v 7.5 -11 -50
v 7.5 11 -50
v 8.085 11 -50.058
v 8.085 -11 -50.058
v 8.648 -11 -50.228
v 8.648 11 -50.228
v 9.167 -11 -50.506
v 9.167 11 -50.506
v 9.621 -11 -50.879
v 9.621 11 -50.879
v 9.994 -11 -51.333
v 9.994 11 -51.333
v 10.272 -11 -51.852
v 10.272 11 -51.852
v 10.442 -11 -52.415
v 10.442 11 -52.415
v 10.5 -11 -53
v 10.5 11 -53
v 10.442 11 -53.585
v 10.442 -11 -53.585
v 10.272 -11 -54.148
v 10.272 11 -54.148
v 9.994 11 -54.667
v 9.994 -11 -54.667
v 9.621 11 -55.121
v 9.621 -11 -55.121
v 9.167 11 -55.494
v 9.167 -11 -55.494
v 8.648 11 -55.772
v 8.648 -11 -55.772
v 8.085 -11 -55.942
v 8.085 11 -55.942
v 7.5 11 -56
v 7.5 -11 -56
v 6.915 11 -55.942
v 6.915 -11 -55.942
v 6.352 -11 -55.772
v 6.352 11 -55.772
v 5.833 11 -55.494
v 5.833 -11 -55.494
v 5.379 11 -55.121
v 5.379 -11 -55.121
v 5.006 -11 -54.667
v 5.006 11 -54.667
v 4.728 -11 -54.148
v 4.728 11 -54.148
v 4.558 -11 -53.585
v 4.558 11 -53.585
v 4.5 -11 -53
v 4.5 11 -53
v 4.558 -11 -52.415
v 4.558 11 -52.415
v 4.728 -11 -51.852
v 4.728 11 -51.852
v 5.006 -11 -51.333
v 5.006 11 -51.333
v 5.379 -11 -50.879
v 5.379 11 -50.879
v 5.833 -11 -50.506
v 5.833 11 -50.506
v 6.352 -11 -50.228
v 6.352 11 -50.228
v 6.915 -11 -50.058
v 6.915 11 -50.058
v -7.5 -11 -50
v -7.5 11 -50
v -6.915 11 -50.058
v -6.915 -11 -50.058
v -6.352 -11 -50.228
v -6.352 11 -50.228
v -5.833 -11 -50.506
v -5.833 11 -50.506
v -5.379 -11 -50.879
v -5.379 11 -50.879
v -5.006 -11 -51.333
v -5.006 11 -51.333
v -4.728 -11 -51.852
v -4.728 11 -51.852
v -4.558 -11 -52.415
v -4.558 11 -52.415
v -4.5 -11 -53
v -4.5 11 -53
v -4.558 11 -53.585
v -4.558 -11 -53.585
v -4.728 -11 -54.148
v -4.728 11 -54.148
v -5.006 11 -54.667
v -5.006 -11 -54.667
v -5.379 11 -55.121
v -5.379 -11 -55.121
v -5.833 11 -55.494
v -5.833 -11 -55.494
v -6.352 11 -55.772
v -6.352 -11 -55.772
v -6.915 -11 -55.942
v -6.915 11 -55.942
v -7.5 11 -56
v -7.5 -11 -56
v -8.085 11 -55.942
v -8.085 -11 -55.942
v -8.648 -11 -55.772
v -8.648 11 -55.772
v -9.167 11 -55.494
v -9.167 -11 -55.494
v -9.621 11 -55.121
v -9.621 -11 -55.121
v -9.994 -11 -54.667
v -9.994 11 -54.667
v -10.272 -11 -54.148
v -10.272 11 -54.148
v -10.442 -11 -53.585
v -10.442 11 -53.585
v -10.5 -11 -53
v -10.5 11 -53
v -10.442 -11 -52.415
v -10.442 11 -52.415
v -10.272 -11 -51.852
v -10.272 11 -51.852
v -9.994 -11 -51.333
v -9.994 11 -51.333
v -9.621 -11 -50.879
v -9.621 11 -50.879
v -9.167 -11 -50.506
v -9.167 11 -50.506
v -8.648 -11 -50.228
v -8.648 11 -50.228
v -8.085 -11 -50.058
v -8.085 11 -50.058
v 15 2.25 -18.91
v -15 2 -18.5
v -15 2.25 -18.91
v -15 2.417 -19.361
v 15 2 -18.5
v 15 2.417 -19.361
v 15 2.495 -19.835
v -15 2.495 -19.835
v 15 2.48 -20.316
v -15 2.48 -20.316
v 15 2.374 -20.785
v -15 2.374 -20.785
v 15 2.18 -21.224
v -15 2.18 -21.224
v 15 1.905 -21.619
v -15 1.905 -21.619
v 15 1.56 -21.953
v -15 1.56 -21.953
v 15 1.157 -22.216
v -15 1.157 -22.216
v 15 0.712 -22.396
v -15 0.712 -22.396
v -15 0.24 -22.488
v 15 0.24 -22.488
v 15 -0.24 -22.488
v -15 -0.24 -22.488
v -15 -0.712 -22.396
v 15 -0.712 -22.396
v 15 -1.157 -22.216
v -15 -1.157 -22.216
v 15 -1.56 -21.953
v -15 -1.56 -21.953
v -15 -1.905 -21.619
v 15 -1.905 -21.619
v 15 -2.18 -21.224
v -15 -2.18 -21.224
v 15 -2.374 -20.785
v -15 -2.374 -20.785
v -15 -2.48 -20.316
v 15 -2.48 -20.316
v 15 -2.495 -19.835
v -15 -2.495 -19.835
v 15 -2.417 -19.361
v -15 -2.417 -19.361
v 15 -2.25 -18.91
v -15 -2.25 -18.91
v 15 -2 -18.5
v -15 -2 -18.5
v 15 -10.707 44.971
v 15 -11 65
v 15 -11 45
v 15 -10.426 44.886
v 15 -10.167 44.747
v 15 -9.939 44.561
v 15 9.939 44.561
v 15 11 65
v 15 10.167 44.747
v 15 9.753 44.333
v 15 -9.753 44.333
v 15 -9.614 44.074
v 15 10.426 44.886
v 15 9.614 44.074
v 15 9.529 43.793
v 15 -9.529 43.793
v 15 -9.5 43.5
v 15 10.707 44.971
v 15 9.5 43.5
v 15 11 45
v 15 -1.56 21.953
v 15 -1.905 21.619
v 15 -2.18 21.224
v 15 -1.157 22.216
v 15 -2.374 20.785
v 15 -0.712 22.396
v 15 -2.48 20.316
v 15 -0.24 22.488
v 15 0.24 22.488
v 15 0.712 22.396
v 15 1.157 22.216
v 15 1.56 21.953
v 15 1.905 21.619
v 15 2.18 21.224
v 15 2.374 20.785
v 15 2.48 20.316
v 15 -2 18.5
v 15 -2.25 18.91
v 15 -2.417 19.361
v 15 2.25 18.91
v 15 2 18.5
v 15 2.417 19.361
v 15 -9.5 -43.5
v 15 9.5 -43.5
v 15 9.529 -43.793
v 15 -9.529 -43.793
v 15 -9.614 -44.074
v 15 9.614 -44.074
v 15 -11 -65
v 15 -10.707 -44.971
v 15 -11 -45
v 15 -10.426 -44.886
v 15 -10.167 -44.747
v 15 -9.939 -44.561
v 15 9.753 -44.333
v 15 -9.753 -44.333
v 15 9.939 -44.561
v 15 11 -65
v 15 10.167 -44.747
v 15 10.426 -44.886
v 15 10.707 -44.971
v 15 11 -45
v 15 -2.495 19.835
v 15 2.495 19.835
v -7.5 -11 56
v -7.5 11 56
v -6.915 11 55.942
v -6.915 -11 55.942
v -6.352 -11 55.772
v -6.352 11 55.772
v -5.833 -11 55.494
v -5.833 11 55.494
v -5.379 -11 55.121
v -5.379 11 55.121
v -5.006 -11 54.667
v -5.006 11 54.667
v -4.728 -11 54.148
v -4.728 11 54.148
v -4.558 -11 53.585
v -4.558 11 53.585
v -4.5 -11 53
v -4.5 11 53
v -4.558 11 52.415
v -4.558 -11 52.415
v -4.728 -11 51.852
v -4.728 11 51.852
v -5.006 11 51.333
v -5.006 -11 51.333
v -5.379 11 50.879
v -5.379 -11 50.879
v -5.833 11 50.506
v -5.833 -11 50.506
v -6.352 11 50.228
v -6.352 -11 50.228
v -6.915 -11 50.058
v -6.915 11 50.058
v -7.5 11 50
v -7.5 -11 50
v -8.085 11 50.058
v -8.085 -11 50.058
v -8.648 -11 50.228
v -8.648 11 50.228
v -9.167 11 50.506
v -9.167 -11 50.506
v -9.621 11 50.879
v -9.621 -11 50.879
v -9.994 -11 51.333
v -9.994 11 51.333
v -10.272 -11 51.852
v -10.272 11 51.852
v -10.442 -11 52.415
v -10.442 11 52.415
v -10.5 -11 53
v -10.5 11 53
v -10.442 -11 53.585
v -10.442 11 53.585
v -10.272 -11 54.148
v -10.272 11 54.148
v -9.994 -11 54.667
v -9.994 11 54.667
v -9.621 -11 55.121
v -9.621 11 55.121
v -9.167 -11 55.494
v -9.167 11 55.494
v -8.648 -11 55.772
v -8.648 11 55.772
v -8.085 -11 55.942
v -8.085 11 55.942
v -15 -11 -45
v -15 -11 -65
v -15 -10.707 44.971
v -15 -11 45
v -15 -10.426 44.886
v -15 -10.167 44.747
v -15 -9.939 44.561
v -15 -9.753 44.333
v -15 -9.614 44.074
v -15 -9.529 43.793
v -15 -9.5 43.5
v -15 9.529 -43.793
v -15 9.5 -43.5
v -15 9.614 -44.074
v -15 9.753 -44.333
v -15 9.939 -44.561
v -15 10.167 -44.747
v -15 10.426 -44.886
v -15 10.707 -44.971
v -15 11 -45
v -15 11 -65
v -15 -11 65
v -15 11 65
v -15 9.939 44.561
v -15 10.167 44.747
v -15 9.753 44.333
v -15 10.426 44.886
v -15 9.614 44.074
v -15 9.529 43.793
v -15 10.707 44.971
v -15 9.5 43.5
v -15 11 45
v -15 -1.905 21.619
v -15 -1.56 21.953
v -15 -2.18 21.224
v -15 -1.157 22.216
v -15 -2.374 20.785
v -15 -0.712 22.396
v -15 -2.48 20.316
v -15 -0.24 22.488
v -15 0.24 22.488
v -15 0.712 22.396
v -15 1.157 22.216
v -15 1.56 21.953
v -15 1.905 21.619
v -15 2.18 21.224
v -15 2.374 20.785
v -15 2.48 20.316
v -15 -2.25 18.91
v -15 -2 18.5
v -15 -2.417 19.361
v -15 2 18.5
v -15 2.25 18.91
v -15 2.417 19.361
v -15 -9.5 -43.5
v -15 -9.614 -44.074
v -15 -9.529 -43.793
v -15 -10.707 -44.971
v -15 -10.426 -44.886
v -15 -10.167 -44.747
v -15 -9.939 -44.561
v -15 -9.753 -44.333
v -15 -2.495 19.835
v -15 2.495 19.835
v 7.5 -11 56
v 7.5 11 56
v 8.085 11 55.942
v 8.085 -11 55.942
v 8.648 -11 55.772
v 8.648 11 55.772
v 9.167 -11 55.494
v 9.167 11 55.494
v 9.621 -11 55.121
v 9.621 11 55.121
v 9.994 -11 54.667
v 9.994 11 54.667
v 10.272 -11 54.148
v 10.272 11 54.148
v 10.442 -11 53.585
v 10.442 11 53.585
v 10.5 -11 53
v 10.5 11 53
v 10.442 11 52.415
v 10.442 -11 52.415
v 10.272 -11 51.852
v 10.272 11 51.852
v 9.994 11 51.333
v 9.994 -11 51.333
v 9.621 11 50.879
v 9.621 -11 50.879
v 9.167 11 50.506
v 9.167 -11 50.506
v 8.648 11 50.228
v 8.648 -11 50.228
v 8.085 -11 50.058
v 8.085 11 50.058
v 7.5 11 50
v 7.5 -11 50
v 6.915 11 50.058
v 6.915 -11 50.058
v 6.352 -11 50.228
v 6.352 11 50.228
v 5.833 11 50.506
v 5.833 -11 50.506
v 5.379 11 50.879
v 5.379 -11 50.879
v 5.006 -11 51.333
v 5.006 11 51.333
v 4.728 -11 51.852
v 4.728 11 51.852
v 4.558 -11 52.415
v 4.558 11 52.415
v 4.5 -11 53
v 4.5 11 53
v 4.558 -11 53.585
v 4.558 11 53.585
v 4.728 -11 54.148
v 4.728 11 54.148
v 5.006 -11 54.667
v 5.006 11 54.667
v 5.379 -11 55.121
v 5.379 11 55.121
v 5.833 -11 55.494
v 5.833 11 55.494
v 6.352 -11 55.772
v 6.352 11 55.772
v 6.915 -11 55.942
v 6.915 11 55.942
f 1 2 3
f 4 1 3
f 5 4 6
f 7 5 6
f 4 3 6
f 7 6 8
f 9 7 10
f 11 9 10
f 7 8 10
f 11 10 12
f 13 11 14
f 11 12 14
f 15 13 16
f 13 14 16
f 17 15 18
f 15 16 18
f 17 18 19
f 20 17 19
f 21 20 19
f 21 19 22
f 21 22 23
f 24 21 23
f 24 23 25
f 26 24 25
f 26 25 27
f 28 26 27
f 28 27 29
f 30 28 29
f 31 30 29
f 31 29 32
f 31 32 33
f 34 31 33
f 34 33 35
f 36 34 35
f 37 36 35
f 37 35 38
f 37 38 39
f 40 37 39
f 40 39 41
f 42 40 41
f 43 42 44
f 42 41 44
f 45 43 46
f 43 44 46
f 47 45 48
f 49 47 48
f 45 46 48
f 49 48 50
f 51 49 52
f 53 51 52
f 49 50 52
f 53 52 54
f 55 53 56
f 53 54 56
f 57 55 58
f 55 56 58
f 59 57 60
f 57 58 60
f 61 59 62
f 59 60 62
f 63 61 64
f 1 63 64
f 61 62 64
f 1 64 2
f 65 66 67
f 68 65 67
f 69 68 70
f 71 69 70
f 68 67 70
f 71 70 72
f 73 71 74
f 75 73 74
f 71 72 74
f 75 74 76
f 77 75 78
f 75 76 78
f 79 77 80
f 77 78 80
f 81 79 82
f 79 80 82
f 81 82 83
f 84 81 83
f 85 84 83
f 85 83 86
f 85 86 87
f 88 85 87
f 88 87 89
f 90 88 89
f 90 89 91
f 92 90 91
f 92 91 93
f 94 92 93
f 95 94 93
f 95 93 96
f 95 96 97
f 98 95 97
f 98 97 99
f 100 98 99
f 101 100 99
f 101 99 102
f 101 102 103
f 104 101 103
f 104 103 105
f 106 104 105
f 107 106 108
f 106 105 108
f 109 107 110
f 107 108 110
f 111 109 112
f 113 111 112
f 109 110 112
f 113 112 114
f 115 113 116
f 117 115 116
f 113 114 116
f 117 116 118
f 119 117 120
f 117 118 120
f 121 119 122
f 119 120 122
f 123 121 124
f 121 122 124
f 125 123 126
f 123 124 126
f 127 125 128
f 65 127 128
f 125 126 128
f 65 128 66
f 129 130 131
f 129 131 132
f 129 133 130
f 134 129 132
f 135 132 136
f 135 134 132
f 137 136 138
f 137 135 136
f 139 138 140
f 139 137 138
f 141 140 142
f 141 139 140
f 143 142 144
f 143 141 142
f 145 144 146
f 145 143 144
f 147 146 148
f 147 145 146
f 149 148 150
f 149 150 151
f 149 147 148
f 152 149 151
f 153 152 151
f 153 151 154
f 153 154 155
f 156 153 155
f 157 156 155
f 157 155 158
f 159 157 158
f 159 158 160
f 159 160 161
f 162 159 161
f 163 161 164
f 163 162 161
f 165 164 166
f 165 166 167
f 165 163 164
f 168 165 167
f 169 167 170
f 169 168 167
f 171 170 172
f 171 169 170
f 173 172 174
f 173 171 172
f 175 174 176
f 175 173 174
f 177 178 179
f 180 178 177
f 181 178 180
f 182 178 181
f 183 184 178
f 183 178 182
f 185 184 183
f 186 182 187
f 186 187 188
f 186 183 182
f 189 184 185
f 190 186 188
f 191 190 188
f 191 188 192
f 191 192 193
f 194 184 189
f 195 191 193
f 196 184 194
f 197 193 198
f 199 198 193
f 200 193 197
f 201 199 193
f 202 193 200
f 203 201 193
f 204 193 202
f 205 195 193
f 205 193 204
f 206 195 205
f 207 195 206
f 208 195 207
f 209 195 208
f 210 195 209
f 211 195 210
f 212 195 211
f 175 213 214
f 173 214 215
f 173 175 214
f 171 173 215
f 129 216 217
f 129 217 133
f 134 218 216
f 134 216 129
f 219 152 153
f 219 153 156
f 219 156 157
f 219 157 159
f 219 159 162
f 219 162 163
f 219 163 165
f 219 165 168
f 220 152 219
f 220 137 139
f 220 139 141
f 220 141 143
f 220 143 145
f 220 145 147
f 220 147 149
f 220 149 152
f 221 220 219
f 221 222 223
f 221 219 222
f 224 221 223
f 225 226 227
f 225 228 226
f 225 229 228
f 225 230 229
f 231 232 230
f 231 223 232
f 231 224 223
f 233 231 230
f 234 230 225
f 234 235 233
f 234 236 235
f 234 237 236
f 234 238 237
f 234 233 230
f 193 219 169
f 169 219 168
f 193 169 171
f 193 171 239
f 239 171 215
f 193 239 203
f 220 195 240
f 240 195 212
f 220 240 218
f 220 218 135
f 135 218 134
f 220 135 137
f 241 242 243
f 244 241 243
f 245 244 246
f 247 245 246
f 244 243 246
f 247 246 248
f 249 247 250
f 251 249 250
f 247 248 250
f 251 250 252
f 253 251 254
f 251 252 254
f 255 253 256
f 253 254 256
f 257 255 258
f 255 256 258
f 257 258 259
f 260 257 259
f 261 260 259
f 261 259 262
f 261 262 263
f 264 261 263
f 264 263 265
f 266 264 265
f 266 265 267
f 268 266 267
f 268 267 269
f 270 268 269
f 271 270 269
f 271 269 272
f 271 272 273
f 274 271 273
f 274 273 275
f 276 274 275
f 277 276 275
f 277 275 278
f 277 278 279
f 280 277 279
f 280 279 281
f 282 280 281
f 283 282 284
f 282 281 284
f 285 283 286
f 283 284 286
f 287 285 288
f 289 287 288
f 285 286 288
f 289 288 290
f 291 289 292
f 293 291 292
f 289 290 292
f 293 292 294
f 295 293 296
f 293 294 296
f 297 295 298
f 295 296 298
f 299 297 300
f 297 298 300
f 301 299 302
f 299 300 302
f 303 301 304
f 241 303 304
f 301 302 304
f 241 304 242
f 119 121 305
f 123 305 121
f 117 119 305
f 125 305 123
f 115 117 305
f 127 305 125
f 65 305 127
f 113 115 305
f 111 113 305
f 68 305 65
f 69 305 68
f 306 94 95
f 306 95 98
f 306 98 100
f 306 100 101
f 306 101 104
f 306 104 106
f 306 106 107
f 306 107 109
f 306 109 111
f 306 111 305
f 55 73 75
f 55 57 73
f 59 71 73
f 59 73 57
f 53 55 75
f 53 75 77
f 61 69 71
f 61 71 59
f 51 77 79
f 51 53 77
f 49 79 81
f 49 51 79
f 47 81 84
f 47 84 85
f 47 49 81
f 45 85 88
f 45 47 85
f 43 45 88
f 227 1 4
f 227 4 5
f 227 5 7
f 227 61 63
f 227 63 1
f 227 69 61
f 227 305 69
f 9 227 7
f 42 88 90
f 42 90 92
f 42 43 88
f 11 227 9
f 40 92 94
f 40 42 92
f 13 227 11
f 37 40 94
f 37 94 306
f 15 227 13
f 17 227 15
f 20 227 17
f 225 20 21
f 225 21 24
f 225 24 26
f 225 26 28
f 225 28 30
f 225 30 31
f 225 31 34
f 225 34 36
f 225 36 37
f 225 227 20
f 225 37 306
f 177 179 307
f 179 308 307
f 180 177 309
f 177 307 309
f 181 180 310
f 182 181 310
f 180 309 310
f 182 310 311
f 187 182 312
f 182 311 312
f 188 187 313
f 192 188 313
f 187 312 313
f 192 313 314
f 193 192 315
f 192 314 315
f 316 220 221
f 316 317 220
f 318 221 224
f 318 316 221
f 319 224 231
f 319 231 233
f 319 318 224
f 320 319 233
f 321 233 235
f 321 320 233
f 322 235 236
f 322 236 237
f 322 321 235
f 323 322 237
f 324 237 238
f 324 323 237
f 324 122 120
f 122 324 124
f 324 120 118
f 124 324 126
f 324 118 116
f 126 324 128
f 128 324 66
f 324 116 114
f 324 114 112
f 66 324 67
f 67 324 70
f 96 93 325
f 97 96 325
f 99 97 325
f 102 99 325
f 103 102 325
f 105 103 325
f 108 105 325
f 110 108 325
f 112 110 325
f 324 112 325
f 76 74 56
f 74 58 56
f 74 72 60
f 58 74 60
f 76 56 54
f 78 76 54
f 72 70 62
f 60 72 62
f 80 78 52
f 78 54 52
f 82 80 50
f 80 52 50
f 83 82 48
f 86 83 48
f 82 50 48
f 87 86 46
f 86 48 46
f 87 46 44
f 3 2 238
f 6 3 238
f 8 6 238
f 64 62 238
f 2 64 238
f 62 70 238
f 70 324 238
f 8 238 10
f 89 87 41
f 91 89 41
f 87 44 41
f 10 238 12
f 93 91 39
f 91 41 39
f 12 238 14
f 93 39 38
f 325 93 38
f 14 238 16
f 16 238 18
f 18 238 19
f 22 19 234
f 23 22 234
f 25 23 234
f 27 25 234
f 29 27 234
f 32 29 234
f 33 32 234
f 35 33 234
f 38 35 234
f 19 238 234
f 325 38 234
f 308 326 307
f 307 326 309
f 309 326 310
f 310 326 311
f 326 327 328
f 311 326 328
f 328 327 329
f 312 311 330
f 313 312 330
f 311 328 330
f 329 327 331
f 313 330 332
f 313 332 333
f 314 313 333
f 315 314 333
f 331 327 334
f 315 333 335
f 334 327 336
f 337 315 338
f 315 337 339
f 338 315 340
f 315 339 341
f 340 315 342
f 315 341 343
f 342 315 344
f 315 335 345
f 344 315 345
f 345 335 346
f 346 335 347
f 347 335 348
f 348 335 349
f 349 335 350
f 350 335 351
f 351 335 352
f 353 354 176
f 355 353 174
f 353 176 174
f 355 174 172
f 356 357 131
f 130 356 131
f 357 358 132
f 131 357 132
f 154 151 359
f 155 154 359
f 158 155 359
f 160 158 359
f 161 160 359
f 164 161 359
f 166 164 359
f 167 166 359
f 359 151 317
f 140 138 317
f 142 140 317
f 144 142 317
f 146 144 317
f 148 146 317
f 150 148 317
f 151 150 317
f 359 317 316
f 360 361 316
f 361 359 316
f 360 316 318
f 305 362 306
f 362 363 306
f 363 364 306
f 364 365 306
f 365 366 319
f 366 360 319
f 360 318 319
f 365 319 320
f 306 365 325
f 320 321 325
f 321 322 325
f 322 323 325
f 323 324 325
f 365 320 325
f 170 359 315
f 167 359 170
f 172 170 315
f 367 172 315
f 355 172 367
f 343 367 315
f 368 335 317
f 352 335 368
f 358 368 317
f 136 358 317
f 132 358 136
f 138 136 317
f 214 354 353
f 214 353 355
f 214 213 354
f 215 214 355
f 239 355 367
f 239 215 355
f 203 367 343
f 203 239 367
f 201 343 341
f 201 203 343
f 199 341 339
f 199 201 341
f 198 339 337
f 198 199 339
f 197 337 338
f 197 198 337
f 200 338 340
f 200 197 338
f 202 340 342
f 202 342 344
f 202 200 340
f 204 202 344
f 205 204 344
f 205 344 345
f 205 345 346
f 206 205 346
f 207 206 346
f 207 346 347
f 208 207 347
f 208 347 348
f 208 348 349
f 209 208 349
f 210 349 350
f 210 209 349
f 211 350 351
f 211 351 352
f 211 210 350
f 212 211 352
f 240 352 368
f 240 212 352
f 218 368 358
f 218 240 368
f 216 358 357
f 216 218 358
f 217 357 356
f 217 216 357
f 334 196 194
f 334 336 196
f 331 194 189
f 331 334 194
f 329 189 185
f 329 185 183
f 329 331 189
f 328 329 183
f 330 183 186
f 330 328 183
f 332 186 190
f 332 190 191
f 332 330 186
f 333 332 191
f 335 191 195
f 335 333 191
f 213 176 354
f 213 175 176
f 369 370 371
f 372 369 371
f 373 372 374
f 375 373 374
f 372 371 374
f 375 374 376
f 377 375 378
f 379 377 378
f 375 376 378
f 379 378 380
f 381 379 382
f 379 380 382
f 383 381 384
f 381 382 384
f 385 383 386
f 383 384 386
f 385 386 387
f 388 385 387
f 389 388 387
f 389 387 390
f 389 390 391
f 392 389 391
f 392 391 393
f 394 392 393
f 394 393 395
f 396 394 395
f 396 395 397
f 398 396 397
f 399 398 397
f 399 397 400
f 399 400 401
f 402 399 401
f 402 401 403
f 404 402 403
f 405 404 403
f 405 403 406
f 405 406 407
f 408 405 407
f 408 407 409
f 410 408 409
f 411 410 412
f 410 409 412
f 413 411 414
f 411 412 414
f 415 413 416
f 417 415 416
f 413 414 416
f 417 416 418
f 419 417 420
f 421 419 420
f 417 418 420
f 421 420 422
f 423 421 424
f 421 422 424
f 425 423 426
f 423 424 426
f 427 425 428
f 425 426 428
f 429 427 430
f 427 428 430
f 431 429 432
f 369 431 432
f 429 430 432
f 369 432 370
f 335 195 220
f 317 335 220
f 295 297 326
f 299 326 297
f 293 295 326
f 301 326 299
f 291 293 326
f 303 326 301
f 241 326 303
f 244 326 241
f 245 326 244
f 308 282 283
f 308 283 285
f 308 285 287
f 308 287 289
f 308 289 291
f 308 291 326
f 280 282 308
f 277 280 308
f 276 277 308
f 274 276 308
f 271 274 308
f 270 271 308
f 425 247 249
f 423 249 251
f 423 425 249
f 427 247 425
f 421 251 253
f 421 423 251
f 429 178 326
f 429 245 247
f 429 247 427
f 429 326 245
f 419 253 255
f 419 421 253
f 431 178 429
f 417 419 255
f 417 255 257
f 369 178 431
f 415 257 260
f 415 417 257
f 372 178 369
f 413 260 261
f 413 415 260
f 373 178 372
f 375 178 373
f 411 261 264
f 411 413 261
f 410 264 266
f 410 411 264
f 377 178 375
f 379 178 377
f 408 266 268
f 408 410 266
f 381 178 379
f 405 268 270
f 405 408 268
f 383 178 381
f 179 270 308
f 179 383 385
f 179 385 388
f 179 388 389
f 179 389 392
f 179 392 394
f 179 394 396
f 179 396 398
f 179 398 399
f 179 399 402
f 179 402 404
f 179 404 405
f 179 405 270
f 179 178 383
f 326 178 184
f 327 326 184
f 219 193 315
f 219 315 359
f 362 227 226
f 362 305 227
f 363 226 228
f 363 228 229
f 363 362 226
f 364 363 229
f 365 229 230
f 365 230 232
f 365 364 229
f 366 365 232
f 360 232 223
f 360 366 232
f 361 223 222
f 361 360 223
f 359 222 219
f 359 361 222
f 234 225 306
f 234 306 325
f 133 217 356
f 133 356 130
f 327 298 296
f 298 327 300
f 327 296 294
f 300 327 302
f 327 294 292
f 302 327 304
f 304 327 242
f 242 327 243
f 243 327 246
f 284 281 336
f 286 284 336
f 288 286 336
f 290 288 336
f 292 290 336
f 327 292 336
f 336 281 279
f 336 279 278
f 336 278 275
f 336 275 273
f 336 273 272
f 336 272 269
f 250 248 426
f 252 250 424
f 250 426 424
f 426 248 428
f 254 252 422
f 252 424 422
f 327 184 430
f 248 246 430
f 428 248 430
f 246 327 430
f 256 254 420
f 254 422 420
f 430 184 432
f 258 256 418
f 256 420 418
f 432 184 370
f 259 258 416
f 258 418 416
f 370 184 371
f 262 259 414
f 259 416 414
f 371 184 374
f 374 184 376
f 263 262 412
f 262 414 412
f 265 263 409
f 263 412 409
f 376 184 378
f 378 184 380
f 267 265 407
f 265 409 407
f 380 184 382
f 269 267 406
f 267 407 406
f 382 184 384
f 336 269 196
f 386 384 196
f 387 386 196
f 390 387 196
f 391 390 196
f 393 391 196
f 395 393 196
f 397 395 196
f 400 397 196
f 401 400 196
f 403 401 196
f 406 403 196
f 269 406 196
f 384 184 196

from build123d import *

# Parameters (mm, degrees)
SKETCH1_W           = 130
SKETCH1_H           = 22
BOSS_EXTRUDE1_DEPTH = 15
SKETCH2_R           = 3
CUT_EXTRUDE1_DEPTH  = 71.242437315
SKETCH3_W           = 90
SKETCH3_H           = 1.5
CUT_EXTRUDE2_DEPTH  = 30
FILLET1_R           = 1.5


with BuildPart() as part:
    # Sketch1 → Boss-Extrude1 (new, symmetric)
    with BuildSketch(Plane(origin=(0, 0, 0), x_dir=(0, 0, -1), z_dir=(1, 0, 0))):
        Rectangle(SKETCH1_W, SKETCH1_H)
        with BuildLine():
            Line((-18.5, 2), (18.5, 2))
            ThreePointArc((18.5, 2), (22.5, 0), (18.5, -2))
            Line((18.5, -2), (-18.5, -2))
            ThreePointArc((-18.5, -2), (-22.5, 0), (-18.5, 2))
        make_face(mode=Mode.SUBTRACT)
    extrude(amount=BOSS_EXTRUDE1_DEPTH, both=True)

    # Sketch2 → Cut-Extrude1 (cut, through all)
    with BuildSketch(Plane(origin=(0, 11, 0), x_dir=(1, 0, 0), z_dir=(0, 1, 0))):
        with Locations(Location((-7.5, 53, 0), (0, 0, 270))):
            Circle(SKETCH2_R)
        with Locations(Location((7.5, 53, 0), (0, 0, 270))):
            Circle(SKETCH2_R)
        with Locations(Location((-7.5, -53, 0), (0, 0, 270))):
            Circle(SKETCH2_R)
        with Locations(Location((7.5, -53, 0), (0, 0, 270))):
            Circle(SKETCH2_R)
    extrude(amount=-CUT_EXTRUDE1_DEPTH, mode=Mode.SUBTRACT)

    # Sketch3 → Cut-Extrude2 (cut)
    with BuildSketch(Plane(origin=(15, 0, 0), x_dir=(0, 0, -1), z_dir=(1, 0, 0))):
        with Locations((0, -10.25)):
            Rectangle(SKETCH3_W, SKETCH3_H)
        with Locations((0, 10.25)):
            Rectangle(SKETCH3_W, SKETCH3_H)
    extrude(amount=-CUT_EXTRUDE2_DEPTH, mode=Mode.SUBTRACT)

    # Fillet1
    fillet1_edges = [part.edges().sort_by_distance(p)[0] for p in [
        (0, -9.5, 45),
        (0, -9.5, -45),
        (0, 9.5, -45),
        (0, 9.5, 45),
    ]]
    fillet(fillet1_edges, radius=FILLET1_R - 0.0001)  # a hair under: the kernel refuses the full size


solid = part.part
